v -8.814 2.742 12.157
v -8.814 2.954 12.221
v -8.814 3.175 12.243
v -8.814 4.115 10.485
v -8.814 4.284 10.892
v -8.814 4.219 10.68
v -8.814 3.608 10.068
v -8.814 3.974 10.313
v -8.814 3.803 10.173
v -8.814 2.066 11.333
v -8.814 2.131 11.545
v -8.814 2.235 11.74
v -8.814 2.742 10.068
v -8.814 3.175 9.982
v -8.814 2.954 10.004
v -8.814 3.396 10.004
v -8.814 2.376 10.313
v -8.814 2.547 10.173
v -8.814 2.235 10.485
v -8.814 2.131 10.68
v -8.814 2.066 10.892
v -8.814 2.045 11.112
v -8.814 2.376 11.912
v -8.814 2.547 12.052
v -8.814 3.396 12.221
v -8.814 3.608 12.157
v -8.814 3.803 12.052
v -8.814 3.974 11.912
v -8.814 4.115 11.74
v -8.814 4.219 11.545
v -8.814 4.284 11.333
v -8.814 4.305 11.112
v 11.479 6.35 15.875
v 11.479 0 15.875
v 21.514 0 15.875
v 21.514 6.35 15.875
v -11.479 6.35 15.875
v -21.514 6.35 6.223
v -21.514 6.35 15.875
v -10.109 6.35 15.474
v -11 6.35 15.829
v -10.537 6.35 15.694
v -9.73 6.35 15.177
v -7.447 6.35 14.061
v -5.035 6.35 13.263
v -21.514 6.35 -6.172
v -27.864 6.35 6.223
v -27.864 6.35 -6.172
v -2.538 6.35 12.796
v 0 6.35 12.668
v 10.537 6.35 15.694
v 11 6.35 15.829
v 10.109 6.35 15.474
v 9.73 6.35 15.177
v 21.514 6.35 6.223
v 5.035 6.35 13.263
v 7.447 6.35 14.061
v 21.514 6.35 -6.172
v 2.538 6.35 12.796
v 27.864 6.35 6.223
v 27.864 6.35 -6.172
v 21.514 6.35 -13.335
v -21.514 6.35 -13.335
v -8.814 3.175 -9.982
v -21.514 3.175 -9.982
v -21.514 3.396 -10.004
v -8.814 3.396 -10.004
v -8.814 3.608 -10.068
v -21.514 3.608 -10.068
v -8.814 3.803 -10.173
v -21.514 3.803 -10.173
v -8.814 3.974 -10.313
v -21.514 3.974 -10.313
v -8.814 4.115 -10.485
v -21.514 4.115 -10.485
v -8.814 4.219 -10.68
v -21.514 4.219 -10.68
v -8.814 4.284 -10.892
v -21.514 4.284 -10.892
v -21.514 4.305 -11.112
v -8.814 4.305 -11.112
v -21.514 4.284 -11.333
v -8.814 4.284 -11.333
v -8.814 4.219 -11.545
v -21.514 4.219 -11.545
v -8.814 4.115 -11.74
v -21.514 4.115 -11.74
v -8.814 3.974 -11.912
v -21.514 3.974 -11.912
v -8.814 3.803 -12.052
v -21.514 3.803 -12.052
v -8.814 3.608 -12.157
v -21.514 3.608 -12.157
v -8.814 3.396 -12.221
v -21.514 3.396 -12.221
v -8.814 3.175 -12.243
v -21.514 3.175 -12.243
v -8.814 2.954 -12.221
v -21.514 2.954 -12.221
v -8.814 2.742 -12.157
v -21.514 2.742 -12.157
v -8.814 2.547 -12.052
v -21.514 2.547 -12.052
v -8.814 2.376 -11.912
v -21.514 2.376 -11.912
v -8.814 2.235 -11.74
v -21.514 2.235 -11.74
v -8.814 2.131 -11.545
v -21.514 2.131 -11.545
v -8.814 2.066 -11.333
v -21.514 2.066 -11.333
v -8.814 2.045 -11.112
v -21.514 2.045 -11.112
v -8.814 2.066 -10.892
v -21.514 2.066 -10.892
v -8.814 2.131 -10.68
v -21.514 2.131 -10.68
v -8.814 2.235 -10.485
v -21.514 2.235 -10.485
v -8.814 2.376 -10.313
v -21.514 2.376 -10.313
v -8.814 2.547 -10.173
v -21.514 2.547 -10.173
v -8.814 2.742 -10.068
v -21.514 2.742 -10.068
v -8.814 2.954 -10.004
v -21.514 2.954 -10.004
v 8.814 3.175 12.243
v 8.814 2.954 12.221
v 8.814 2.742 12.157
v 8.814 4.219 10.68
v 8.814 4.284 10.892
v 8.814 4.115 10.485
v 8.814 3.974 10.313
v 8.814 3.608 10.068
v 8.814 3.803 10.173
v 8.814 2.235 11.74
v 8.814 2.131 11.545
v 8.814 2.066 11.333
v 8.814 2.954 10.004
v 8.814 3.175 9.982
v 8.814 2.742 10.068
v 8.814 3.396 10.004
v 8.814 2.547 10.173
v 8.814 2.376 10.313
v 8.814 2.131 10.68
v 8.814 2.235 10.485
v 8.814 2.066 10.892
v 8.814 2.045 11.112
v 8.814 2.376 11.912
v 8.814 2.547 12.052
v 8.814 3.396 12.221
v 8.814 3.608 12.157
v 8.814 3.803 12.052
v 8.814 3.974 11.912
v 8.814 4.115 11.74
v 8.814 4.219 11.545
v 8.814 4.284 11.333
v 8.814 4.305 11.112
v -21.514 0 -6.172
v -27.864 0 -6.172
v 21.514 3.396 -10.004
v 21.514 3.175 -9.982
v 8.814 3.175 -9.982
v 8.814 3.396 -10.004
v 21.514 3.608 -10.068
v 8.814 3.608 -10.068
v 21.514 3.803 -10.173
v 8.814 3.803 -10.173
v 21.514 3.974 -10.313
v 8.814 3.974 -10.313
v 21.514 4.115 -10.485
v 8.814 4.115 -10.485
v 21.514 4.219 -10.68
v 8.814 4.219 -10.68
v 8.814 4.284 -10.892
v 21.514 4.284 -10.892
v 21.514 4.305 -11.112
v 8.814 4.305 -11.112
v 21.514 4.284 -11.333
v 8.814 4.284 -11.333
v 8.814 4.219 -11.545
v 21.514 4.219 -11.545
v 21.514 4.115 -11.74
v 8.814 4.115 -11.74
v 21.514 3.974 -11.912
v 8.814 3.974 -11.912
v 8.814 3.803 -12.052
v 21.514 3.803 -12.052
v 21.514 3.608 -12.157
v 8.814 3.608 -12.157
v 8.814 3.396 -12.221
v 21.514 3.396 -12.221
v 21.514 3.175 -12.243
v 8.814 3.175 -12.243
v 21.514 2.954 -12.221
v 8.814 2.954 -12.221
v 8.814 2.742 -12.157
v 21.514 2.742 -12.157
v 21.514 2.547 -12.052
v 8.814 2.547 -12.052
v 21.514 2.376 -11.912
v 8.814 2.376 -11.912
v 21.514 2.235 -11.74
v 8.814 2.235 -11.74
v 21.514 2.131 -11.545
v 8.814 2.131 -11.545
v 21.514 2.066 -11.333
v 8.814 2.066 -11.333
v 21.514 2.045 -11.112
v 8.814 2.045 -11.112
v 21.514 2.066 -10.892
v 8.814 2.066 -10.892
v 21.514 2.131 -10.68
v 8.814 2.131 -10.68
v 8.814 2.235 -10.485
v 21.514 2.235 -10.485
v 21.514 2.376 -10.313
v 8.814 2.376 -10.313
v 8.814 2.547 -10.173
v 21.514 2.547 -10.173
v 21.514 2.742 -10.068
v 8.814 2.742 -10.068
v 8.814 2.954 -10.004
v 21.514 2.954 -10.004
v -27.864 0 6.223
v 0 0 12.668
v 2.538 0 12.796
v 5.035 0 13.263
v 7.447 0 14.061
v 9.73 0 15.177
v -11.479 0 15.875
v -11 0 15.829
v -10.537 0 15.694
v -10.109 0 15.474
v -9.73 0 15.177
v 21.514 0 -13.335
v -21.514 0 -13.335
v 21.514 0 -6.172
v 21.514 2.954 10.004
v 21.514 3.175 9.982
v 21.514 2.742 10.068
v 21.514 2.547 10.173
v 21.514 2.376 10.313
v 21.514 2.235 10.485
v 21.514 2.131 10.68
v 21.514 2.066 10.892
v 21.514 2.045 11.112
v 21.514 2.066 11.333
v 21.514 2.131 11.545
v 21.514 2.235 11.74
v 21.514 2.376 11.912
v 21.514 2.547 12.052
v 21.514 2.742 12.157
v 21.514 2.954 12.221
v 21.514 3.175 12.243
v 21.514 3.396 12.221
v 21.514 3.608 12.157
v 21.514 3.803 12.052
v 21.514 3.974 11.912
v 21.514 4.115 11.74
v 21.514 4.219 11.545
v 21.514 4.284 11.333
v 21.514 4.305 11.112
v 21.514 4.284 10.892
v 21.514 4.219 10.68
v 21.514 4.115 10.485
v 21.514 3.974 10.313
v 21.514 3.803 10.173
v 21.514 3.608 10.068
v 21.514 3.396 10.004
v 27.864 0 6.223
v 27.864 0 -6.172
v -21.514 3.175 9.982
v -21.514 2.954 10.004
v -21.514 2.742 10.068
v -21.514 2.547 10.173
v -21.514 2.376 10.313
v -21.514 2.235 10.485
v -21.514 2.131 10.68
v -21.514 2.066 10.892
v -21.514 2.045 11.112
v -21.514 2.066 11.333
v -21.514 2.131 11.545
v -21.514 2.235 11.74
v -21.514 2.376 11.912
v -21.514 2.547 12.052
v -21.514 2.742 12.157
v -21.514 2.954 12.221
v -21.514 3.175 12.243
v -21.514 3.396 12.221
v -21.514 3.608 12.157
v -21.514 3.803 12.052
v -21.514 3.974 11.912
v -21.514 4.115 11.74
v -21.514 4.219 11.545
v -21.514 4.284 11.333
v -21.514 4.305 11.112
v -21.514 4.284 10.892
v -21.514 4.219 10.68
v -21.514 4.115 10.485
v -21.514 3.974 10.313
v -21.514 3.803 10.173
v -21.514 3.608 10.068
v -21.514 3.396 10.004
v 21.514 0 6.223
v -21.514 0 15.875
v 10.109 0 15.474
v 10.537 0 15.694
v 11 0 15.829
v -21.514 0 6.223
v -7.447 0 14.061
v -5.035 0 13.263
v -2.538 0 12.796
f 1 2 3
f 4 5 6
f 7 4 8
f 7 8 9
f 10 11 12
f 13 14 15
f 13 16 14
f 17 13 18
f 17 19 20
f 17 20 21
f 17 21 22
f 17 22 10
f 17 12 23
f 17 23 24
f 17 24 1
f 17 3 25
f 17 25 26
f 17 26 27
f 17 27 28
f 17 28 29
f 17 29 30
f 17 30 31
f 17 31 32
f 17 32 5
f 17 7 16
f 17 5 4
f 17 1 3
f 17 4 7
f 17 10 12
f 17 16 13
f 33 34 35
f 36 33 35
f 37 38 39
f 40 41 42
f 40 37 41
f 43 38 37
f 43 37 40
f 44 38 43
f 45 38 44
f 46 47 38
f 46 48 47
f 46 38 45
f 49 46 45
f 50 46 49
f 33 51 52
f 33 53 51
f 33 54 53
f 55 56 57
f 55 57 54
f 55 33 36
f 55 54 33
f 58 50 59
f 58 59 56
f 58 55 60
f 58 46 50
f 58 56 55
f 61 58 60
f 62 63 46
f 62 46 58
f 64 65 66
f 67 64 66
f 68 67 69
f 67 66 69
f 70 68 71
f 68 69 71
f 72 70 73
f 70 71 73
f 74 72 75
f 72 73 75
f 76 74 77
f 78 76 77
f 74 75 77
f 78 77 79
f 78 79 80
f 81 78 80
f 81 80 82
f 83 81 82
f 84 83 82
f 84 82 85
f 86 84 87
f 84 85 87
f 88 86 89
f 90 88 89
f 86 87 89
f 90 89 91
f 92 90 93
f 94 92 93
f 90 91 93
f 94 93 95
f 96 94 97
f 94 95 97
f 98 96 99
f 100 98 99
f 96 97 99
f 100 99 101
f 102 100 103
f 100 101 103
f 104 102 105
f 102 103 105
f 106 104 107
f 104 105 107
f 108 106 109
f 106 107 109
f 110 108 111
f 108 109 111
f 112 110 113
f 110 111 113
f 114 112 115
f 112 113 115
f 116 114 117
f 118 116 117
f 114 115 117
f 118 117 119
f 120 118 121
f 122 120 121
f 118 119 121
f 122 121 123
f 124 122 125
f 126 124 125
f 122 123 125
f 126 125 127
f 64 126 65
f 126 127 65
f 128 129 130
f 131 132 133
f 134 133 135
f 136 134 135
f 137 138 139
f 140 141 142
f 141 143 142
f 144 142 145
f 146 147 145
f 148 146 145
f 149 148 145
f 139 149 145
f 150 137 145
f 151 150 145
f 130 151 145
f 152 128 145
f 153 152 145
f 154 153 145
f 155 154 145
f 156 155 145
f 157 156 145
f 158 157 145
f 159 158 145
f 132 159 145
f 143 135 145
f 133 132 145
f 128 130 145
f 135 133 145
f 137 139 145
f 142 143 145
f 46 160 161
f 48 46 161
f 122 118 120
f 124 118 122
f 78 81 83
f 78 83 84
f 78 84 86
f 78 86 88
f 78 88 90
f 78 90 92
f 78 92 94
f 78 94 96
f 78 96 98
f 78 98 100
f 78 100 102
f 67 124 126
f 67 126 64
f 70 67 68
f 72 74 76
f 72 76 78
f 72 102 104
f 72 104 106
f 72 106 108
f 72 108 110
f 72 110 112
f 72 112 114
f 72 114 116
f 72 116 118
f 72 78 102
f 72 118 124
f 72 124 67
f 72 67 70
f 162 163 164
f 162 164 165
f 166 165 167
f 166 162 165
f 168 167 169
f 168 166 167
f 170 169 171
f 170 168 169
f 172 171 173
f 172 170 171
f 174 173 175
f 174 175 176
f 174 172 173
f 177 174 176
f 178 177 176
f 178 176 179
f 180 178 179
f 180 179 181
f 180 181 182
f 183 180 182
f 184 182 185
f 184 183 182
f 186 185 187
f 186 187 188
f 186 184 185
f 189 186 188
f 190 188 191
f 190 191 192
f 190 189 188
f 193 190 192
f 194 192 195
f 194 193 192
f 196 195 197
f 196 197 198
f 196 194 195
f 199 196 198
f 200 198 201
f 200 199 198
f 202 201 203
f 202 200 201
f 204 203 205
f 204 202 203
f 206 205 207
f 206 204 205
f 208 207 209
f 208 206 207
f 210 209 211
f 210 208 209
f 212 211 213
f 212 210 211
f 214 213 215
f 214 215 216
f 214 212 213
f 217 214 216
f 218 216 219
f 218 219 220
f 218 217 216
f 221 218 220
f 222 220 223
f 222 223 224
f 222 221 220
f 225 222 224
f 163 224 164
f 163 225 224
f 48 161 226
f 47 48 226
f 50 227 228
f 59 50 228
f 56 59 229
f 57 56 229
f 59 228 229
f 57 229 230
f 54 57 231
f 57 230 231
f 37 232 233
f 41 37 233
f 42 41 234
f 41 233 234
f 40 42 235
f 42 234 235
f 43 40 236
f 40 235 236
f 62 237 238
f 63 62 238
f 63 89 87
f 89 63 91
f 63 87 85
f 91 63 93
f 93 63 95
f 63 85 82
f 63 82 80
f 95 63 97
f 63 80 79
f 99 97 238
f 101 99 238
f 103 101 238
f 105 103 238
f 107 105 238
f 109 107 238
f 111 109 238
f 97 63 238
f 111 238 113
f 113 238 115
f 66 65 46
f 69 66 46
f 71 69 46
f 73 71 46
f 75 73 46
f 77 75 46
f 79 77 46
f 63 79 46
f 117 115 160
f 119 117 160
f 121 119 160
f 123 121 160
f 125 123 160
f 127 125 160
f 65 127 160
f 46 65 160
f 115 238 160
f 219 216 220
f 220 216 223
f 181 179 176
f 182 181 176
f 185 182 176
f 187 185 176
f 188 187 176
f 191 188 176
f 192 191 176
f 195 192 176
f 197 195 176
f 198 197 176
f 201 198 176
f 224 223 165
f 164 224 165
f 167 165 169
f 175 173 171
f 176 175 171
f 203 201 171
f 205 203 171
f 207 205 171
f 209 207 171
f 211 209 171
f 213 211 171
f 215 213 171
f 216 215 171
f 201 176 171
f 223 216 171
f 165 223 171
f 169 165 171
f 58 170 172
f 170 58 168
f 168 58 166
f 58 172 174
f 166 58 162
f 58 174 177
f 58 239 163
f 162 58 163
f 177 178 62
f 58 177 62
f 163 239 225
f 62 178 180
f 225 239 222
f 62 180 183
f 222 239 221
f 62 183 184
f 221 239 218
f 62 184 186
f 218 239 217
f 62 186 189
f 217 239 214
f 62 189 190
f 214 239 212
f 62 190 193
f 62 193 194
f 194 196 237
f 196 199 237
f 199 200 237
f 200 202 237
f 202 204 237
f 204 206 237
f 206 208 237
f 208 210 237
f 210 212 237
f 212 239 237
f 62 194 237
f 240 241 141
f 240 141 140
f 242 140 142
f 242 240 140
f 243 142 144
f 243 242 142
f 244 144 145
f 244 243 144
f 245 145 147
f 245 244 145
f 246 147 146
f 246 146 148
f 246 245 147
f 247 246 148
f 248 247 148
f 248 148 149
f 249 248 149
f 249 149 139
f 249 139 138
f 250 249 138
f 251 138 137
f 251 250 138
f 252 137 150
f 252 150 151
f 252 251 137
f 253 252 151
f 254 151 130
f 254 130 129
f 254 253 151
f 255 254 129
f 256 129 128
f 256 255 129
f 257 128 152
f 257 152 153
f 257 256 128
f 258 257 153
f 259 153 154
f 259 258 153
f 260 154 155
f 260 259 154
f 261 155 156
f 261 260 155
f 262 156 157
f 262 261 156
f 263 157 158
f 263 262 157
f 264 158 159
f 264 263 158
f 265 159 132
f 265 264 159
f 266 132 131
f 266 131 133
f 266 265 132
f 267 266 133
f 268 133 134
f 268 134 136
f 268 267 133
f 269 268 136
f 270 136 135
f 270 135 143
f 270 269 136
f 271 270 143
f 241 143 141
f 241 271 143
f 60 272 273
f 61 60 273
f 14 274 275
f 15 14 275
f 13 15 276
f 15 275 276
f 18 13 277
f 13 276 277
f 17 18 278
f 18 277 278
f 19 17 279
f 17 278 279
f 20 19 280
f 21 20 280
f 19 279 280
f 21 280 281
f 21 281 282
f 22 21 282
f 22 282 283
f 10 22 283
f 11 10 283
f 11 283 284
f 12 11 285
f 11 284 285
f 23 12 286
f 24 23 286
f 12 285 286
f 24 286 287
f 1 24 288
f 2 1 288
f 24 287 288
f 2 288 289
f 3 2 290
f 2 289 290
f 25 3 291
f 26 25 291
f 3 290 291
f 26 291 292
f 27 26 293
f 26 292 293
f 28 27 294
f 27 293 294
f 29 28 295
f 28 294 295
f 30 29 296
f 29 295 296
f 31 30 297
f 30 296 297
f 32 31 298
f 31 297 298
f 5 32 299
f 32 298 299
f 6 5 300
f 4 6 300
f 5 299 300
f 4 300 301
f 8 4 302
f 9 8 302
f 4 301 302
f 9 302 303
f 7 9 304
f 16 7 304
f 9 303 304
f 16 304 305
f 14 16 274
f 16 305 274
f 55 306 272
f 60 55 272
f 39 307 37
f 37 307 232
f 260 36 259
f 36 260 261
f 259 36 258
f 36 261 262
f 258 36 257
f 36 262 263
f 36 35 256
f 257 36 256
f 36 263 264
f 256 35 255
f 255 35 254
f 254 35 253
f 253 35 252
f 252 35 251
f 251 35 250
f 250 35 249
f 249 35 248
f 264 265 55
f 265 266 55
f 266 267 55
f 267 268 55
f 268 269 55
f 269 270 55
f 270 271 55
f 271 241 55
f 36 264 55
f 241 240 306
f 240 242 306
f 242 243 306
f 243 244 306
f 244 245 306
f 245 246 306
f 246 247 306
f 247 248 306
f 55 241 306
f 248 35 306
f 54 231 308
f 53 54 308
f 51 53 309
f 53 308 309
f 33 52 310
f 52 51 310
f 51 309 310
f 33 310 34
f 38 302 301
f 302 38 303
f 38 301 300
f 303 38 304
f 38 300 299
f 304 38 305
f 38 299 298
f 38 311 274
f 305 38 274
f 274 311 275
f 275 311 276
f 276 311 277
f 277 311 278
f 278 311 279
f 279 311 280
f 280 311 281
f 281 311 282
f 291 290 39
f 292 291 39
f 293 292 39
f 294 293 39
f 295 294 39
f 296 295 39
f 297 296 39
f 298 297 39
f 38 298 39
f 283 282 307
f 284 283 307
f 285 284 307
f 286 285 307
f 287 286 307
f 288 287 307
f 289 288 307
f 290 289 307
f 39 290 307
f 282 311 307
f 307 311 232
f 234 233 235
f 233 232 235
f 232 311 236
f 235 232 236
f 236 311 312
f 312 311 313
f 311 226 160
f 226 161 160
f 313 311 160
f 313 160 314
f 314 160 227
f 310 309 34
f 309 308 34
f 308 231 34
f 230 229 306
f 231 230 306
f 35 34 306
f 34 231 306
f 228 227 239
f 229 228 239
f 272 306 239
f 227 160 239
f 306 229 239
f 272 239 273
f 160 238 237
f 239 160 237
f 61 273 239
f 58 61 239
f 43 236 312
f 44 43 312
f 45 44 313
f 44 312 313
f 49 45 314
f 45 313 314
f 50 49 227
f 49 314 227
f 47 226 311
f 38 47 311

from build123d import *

# Parameters (mm, degrees)
BOSS_EXTRUDE1_DEPTH = 6.35
SKETCH2_R           = 1.1303
CUT_EXTRUDE1_DEPTH  = 12.7
FILLET1_R           = 2.54


with BuildPart() as part:
    # Sketch1 → Boss-Extrude1 (new body)
    with BuildSketch(Plane(origin=(0, 0, 0), x_dir=(1, 0, 0), z_dir=(0, 1, 0))):
        with BuildLine():
            Line((-21.5138, -15.875), (-9.729950234, -15.875))
            Line((-9.729950234, -15.875), (-9.729950234, -15.176835913))
            ThreePointArc((-9.729950234, -15.176835913), (-5.035098569, -13.262737362), (0, -12.668441286))
            ThreePointArc((0, -12.668441286), (5.035098569, -13.262737362), (9.729950234, -15.176835913))
            Line((9.729950234, -15.176835913), (9.729950234, -15.875))
            Line((9.729950234, -15.875), (21.5138, -15.875))
            Line((21.5138, -15.875), (21.5138, -6.223))
            Line((21.5138, -6.223), (27.8638, -6.223))
            Line((27.8638, -6.223), (27.8638, 6.1722))
            Line((27.8638, 6.1722), (21.5138, 6.1722))
            Line((21.5138, 6.1722), (21.5138, 13.335))
            Line((21.5138, 13.335), (-21.5138, 13.335))
            Line((-21.5138, 13.335), (-21.5138, 6.1722))
            Line((-21.5138, 6.1722), (-27.8638, 6.1722))
            Line((-27.8638, 6.1722), (-27.8638, -6.223))
            Line((-27.8638, -6.223), (-21.5138, -6.223))
            Line((-21.5138, -6.223), (-21.5138, -15.875))
        make_face()
    extrude(amount=BOSS_EXTRUDE1_DEPTH)

    # Sketch2 → Cut-Extrude1 (cut)
    with BuildSketch(Plane.ZY.offset(21.5138)):
        with Locations((-11.1125, 3.175)):
            Circle(SKETCH2_R)
        with Locations(Location((11.1125, 3.175, 0), (0, 0, 180))):
            Circle(SKETCH2_R)
    cut_extrude1 = extrude(amount=-CUT_EXTRUDE1_DEPTH, mode=Mode.SUBTRACT)

    # Mirror1: Cut-Extrude1 across plane
    add(cut_extrude1.mirror(Plane(origin=(0, 0, 0), x_dir=(0, 0, 1), z_dir=(1, 0, 0))), mode=Mode.SUBTRACT)

    # Fillet1
    # the kernel refuses this fillet: 2.54 mm, written as the material it takes off along each edge
    with BuildSketch(Plane(origin=(9.729950234, -4.372671145, 15.875), x_dir=(0, 0, -1), z_dir=(0, 1, 0))) as fillet1_piece_1:
        with BuildLine():
            CenterArc((2.54, -1.749068458), FILLET1_R, 136.479850512, 43.520149488)
            Line((0, -1.749068458), (-0.0508, -1.749068458))
            Line((-0.0508, -1.749068458), (-0.0508, 0))
            Line((-0.0508, 0), (0, 0.0508))
            ThreePointArc((0, 0.0508), (0.349082044, 0.0508), (0.661327369, 0.034981369))
            Line((0.661327369, 0.034981369), (0.698164087, 0))
        make_face()
    extrude(amount=15.095342289, mode=Mode.SUBTRACT)
    with BuildSketch(Plane(origin=(-9.729950234, -4.372671145, 15.875), x_dir=(-1, 0, 0), z_dir=(0, 1, 0))) as fillet1_piece_2:
        with BuildLine():
            CenterArc((1.749068458, -2.54), FILLET1_R, 90, 43.520149488)
            Line((0, -0.698164087), (-0.034981369, -0.661327369))
            ThreePointArc((-0.034981369, -0.661327369), (-0.0508, -0.349082044), (-0.0508, 0))
            Line((-0.0508, 0), (0, 0.0508))
            Line((0, 0.0508), (1.749068458, 0.0508))
            Line((1.749068458, 0.0508), (1.749068458, 0))
        make_face()
    extrude(amount=15.095342289, mode=Mode.SUBTRACT)


solid = part.part
